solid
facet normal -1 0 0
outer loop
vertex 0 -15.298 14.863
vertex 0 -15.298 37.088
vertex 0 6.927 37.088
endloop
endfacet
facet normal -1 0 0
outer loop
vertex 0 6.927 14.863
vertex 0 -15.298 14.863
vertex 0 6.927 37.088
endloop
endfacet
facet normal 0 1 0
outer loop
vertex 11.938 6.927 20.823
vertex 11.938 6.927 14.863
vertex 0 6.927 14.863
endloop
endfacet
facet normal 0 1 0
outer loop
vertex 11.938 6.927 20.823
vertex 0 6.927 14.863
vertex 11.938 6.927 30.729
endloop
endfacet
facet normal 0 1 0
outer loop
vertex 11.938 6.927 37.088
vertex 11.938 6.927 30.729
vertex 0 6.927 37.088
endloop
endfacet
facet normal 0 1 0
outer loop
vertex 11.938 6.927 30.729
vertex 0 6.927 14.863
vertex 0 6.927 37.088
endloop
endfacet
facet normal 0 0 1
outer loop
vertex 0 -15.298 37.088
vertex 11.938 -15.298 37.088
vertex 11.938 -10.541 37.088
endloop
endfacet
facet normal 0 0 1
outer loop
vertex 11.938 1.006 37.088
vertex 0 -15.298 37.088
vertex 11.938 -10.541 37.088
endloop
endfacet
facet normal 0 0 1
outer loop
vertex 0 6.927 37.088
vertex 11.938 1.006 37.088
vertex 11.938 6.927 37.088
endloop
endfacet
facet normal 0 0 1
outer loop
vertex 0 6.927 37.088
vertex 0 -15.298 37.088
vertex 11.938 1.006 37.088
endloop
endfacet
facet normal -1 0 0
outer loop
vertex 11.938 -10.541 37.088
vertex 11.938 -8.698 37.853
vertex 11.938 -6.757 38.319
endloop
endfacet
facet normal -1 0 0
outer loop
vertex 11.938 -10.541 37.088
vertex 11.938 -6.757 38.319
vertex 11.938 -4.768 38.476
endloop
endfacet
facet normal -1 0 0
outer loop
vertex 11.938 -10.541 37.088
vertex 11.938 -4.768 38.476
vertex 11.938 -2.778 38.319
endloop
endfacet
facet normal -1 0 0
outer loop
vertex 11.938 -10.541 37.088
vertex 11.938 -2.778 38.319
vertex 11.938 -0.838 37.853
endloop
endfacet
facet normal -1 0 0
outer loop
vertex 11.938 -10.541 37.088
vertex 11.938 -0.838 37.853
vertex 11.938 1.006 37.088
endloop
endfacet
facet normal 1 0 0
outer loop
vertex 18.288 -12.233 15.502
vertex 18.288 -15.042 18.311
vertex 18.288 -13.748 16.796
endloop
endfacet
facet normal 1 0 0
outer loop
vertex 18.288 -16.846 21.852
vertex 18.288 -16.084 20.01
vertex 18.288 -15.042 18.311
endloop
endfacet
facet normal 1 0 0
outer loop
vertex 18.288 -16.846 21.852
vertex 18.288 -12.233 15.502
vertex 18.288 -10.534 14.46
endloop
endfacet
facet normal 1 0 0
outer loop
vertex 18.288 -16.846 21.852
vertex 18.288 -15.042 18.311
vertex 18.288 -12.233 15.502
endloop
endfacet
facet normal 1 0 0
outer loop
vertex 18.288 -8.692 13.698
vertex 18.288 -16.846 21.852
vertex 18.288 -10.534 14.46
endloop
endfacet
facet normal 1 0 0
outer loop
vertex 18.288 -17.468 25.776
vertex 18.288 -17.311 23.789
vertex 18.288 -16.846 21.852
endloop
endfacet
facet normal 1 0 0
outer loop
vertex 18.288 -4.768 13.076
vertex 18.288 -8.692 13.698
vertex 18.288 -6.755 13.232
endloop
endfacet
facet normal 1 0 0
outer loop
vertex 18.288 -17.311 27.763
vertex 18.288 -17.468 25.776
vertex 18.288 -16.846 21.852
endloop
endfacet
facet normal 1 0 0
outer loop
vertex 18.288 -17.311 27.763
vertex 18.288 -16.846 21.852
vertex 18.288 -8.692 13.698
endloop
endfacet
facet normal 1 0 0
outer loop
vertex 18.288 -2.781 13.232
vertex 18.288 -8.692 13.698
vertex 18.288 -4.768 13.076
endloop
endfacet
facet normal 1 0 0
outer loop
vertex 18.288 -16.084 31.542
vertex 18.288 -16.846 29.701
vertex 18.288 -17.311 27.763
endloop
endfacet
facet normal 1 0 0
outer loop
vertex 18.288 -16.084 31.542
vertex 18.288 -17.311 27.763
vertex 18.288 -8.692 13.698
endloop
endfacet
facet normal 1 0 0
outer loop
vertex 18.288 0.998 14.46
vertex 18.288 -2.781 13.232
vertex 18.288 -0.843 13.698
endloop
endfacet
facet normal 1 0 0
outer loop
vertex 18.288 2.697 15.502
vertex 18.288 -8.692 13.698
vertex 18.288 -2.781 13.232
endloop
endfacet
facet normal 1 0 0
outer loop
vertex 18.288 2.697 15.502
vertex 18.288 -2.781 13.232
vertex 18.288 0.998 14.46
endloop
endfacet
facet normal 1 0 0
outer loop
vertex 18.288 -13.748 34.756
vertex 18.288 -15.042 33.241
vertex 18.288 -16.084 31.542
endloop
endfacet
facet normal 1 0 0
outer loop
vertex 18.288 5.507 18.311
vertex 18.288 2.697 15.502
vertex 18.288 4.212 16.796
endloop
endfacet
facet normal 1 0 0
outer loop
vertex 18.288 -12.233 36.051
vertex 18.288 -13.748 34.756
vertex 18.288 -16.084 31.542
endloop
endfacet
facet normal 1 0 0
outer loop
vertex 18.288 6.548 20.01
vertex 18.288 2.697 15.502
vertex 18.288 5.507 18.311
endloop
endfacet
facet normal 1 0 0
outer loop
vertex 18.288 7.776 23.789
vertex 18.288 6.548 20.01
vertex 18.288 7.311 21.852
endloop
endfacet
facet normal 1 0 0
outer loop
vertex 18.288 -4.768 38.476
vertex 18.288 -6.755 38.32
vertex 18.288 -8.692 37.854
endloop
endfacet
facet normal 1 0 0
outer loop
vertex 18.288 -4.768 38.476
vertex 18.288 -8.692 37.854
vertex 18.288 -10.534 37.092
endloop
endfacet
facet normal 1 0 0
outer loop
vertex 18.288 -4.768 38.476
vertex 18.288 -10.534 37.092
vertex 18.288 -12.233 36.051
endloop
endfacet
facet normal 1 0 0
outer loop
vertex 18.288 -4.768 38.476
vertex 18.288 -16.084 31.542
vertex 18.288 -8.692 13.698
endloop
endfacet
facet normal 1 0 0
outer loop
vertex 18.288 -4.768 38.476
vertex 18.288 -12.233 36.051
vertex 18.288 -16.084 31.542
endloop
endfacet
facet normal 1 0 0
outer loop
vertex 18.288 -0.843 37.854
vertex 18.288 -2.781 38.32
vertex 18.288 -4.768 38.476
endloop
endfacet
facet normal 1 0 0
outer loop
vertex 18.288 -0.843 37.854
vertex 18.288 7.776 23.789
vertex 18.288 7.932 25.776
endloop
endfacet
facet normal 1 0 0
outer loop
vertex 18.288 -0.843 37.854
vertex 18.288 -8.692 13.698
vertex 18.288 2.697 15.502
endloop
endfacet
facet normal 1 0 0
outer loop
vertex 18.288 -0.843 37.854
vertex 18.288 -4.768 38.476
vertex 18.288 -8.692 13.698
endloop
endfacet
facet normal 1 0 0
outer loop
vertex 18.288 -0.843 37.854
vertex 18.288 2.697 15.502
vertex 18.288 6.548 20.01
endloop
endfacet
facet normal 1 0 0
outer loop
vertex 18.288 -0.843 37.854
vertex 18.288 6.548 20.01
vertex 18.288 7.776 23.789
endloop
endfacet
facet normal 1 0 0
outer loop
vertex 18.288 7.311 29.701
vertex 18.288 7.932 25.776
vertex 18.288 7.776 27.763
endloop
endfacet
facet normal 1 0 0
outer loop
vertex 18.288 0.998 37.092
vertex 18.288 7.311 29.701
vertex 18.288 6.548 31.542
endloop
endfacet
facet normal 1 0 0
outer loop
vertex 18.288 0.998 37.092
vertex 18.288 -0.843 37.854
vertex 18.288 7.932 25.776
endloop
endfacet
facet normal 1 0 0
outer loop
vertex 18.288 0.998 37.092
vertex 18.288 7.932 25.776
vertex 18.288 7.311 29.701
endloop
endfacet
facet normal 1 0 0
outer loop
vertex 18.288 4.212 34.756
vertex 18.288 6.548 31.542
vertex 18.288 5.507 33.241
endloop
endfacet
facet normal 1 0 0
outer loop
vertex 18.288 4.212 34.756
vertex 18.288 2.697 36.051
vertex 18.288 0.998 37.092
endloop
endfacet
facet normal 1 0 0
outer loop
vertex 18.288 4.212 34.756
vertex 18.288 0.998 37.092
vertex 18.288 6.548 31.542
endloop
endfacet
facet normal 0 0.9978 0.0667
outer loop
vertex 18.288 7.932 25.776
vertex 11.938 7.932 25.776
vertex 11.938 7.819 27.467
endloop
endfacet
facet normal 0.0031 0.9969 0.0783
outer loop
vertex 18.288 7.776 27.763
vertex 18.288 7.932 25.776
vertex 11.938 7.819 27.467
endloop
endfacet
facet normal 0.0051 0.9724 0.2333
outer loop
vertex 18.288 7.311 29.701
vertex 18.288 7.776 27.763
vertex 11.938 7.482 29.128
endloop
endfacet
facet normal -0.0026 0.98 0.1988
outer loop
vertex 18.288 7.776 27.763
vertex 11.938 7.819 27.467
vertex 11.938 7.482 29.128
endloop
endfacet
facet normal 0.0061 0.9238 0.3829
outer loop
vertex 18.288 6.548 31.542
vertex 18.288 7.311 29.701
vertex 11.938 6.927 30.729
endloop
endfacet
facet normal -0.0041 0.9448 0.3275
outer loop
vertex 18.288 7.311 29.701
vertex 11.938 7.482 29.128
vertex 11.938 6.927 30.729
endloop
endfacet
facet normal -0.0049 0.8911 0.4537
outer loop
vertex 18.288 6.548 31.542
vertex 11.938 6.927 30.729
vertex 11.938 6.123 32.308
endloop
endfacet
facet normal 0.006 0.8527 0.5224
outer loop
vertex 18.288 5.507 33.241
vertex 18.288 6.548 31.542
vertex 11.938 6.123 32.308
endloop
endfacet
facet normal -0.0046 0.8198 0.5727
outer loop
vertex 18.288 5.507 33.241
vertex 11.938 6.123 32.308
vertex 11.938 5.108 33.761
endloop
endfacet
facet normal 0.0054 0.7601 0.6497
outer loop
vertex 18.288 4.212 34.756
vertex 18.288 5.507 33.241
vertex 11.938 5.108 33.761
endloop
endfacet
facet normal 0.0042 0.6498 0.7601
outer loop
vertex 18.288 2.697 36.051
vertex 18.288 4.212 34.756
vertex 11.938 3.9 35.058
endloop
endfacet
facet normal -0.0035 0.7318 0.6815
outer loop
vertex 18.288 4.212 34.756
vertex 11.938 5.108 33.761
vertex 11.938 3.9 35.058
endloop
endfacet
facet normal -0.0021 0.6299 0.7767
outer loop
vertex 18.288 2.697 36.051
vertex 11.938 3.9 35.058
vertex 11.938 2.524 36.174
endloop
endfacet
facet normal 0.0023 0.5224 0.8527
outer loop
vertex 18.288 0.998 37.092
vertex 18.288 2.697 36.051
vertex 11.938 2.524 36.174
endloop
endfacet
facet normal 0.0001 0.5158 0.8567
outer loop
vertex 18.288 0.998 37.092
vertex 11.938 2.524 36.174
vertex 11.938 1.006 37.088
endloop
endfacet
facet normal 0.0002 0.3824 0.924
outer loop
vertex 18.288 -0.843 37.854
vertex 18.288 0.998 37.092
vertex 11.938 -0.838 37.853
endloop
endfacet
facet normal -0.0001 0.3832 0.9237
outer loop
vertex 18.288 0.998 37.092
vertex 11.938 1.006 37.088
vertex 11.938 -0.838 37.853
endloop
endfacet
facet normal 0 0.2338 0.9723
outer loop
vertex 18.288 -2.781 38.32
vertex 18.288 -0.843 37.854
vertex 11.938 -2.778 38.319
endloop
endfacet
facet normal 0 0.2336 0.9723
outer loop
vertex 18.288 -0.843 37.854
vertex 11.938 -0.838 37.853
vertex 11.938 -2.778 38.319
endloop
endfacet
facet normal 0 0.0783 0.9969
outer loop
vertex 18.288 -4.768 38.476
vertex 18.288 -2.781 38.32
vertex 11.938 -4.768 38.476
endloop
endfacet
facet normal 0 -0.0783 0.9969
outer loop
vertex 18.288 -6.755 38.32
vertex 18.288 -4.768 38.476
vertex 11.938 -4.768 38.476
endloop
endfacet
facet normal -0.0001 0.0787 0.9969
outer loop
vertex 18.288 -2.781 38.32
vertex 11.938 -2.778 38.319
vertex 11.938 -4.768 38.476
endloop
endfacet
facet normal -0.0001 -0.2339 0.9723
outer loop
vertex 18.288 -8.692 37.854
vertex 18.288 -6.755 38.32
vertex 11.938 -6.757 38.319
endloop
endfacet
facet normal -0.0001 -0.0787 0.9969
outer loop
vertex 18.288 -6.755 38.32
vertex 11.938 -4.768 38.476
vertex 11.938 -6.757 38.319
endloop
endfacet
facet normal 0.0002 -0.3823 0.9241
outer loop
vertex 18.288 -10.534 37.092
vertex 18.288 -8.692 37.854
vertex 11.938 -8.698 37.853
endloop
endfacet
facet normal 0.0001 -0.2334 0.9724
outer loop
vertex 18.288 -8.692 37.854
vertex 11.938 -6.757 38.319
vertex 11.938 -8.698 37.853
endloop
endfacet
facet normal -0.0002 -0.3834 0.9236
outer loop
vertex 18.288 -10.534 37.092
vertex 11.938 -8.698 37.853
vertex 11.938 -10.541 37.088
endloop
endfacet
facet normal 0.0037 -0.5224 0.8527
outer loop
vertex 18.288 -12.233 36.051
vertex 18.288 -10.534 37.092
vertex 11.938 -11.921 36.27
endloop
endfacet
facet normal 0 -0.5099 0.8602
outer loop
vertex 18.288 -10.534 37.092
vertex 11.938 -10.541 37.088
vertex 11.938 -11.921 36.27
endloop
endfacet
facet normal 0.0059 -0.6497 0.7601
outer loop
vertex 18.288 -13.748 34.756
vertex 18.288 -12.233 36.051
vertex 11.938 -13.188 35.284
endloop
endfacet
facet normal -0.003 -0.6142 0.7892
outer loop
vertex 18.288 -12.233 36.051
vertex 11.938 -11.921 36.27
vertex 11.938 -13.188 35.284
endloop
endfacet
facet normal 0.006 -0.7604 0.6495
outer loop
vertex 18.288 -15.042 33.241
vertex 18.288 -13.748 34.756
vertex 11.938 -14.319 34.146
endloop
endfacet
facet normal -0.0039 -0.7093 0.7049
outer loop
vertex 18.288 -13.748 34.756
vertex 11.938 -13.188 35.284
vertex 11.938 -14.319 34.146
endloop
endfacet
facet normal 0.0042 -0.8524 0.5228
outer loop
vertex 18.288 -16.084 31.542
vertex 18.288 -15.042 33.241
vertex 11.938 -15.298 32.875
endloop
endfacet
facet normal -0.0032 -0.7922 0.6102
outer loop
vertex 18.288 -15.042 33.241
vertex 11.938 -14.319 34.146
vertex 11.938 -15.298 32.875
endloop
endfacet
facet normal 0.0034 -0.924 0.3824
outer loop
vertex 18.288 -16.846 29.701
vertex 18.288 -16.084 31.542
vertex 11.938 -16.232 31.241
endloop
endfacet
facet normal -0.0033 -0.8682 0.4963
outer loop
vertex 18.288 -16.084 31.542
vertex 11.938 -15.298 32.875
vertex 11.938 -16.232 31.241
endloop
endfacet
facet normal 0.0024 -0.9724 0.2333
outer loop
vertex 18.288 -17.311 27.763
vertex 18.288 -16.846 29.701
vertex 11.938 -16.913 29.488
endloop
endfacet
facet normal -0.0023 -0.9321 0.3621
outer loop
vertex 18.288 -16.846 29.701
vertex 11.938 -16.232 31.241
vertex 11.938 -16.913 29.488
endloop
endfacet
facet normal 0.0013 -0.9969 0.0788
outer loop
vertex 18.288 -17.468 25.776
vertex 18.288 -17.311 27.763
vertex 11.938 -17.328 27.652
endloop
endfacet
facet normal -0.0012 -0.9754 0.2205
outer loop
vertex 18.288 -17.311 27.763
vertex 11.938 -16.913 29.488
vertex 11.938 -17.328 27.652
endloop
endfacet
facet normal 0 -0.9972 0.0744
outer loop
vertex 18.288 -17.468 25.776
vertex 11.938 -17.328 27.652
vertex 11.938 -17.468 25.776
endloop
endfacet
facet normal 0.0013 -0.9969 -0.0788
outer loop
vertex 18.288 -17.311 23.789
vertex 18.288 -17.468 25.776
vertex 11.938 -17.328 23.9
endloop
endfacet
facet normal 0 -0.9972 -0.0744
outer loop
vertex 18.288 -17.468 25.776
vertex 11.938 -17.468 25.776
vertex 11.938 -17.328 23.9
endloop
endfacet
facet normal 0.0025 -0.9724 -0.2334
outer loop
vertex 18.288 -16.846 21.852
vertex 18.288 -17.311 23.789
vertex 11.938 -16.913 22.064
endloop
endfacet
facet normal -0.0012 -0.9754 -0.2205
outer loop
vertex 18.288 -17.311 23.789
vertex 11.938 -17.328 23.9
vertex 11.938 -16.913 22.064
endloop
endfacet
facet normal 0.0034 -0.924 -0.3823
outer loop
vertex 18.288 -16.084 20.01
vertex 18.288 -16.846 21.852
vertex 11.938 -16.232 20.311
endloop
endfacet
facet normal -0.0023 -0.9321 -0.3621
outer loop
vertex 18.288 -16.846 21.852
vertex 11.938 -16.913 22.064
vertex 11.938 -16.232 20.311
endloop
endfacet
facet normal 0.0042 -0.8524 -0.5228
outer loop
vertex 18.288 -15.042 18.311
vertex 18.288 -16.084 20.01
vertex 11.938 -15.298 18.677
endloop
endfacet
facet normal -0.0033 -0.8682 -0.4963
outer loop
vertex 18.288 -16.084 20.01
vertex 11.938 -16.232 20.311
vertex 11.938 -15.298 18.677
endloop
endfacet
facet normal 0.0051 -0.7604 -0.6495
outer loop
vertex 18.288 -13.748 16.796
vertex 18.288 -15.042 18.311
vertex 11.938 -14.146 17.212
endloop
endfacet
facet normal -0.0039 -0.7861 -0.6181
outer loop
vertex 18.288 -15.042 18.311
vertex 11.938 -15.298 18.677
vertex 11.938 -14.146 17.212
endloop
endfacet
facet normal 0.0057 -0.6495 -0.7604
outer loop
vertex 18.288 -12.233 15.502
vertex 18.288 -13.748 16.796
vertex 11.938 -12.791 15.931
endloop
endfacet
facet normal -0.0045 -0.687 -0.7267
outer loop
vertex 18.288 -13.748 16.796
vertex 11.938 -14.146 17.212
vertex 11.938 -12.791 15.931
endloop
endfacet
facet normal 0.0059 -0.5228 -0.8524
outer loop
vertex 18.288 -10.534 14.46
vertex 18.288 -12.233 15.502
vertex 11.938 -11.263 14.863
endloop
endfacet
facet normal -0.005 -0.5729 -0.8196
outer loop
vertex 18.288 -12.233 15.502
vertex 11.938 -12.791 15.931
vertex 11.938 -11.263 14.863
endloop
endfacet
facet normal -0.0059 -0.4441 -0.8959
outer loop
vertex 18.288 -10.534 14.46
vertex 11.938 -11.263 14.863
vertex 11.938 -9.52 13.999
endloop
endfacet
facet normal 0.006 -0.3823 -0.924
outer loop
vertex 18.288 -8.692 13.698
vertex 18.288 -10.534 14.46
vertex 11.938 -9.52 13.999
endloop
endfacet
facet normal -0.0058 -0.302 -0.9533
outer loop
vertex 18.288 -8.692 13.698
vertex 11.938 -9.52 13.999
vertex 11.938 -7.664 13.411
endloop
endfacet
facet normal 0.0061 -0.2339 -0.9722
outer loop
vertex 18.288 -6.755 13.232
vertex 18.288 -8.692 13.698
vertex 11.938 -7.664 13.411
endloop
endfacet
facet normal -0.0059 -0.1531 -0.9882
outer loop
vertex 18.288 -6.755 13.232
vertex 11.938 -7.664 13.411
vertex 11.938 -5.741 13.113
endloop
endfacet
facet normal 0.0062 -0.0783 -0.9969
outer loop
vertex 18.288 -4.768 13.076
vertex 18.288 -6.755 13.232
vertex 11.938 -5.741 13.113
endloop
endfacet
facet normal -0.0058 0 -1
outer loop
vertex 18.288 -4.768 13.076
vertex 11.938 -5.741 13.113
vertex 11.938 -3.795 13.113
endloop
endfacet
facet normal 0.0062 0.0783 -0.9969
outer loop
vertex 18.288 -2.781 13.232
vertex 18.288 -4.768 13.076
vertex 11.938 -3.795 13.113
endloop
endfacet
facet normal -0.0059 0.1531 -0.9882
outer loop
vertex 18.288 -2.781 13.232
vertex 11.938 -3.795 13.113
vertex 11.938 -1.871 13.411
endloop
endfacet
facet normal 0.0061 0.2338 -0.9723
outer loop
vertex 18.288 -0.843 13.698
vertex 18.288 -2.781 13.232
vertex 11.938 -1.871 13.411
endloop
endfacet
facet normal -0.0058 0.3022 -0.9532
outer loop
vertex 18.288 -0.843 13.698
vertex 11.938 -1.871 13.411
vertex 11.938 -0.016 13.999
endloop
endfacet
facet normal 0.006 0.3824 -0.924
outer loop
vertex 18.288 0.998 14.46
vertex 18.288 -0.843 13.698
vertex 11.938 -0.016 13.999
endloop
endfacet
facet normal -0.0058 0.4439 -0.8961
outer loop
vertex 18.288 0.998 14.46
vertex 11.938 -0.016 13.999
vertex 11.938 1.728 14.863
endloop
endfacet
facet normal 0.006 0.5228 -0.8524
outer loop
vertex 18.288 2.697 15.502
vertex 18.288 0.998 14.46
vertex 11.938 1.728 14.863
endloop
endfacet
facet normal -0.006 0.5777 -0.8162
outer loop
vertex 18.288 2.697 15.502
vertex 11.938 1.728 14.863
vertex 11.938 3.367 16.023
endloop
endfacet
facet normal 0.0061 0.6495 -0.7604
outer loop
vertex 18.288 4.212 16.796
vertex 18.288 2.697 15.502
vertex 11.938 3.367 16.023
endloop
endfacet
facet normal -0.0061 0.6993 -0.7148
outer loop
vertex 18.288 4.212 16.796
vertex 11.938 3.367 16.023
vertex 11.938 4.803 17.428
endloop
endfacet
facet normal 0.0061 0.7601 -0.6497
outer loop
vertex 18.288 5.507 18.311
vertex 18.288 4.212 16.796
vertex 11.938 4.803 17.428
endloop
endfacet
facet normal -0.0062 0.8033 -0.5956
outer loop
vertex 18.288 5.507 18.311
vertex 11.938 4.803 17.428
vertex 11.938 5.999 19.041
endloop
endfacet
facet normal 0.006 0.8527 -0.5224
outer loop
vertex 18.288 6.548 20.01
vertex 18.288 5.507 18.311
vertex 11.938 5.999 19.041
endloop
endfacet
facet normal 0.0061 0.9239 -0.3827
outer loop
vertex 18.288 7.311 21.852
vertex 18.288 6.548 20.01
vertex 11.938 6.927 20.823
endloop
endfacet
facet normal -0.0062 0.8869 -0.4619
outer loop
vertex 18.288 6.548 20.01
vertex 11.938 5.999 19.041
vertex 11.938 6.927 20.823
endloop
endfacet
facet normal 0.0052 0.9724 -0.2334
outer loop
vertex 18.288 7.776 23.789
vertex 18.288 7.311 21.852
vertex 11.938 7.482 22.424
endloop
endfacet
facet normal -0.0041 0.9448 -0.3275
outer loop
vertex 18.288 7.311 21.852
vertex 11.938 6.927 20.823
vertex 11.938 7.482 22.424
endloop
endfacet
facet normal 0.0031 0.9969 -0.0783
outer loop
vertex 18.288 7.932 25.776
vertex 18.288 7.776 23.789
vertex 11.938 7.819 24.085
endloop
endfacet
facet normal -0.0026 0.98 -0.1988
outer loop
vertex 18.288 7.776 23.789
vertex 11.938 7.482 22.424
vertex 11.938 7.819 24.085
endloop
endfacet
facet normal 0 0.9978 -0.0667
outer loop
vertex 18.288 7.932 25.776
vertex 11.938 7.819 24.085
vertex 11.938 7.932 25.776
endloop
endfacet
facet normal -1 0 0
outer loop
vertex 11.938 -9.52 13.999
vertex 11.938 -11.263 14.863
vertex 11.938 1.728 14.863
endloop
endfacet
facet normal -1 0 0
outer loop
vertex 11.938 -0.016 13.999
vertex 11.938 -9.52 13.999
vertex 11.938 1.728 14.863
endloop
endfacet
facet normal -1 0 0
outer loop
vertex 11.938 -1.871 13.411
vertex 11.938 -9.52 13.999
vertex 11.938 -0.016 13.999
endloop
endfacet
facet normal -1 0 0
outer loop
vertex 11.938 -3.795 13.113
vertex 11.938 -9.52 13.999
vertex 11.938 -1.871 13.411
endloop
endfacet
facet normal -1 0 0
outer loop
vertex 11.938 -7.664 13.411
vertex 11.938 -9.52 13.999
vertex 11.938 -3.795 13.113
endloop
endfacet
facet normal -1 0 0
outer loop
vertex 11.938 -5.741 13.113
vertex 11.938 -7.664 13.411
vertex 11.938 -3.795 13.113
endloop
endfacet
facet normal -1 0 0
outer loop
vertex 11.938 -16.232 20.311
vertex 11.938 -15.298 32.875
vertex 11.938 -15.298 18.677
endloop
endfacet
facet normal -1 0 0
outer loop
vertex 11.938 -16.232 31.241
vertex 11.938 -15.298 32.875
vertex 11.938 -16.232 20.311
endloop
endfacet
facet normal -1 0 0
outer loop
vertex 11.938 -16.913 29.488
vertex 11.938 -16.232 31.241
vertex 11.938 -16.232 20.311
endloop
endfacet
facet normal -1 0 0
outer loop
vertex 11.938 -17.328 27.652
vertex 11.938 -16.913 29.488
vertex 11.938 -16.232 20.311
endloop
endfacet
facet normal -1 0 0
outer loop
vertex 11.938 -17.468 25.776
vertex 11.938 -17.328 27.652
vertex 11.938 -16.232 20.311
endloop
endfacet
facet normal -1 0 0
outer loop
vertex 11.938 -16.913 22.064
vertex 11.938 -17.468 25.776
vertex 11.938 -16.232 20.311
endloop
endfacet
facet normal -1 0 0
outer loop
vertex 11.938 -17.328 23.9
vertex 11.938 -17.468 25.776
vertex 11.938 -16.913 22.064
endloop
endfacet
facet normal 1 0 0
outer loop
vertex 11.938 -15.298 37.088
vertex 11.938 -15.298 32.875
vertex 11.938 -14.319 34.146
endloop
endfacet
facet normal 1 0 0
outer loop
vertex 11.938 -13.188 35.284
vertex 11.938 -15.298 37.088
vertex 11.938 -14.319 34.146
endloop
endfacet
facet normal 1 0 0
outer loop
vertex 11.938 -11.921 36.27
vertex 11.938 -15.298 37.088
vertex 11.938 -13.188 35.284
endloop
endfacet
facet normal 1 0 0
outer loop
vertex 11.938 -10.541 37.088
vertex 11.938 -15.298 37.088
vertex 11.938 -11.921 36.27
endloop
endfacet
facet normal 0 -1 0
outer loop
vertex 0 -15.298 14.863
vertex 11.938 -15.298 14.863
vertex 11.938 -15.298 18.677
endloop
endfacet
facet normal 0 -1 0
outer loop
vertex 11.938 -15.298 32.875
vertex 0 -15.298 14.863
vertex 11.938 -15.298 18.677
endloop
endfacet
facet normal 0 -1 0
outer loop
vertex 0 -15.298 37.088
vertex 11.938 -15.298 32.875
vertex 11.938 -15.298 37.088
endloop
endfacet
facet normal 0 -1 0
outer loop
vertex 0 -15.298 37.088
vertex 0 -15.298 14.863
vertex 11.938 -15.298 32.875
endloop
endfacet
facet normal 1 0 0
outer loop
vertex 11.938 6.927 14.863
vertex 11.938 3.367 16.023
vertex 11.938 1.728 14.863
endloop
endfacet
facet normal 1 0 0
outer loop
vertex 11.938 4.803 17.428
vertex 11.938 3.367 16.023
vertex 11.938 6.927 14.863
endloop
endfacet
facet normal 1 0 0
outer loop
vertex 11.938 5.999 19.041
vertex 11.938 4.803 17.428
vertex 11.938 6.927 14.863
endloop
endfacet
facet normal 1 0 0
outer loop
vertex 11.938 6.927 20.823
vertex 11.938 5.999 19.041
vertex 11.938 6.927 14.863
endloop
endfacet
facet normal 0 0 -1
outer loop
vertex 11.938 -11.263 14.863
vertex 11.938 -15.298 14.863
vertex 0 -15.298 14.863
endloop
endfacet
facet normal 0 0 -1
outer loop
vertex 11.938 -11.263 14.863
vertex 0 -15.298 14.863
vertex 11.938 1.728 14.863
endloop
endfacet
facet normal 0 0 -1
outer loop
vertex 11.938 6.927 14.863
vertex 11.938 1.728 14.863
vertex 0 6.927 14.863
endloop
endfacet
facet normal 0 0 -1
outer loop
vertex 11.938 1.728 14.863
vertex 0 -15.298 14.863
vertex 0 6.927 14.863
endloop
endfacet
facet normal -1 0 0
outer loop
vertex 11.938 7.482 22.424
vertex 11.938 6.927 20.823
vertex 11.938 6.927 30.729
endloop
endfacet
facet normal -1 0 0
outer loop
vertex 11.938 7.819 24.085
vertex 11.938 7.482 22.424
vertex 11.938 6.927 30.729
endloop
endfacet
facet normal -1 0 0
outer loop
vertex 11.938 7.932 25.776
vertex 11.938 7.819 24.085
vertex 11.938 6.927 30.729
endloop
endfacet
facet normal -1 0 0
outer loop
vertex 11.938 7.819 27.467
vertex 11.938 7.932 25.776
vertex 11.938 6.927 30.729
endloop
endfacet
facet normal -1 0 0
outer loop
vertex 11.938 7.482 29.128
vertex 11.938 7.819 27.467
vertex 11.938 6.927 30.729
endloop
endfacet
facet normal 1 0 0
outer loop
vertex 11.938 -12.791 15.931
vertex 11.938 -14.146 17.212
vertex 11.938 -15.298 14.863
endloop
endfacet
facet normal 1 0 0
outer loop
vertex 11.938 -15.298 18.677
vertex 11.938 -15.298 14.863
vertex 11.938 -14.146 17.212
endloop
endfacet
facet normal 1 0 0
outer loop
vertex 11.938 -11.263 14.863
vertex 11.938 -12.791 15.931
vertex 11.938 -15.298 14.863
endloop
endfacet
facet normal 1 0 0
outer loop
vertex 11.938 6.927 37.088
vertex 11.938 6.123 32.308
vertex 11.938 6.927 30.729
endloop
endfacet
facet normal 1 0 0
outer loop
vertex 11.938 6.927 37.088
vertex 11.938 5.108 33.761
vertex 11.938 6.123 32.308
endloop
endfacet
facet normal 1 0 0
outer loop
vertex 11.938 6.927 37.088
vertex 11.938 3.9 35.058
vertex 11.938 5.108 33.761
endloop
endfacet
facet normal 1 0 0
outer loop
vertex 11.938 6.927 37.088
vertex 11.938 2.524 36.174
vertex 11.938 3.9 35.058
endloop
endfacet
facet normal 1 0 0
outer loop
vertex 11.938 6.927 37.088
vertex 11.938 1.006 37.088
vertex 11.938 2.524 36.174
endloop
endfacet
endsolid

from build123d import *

# Parameters (mm, degrees)
F0_W     = 22.225
F0_H     = 22.225
F0_R     = 5.08
F1_DEPTH = 11.938
F2_DEPTH = 18.288
F4_R     = 12.7
F5_DEPTH = 6.35


with BuildPart() as f1:
    # F0 (on Right) → F1 (new body)
    with BuildSketch(Plane.YZ):
        with Locations((-4.1858740151, 25.9753634954)):
            Rectangle(F0_W, F0_H)
        with Locations((-4.1858740151, 25.9753634954)):
            Circle(F0_R, mode=Mode.SUBTRACT)
    extrude(amount=F1_DEPTH)

    # F0 (on Right) → F2 (join)
    with BuildSketch(Plane.YZ):
        with Locations((-4.1858740151, 25.9753634954)):
            Circle(F0_R)
    extrude(amount=F2_DEPTH)

    # F4 (on offset) → F5 (join)
    with BuildSketch(Plane.YZ.offset(11.938)):
        with Locations((-4.7678221017, 25.7760342211)):
            Circle(F4_R)
    extrude(amount=F5_DEPTH)


solid = f1.part
